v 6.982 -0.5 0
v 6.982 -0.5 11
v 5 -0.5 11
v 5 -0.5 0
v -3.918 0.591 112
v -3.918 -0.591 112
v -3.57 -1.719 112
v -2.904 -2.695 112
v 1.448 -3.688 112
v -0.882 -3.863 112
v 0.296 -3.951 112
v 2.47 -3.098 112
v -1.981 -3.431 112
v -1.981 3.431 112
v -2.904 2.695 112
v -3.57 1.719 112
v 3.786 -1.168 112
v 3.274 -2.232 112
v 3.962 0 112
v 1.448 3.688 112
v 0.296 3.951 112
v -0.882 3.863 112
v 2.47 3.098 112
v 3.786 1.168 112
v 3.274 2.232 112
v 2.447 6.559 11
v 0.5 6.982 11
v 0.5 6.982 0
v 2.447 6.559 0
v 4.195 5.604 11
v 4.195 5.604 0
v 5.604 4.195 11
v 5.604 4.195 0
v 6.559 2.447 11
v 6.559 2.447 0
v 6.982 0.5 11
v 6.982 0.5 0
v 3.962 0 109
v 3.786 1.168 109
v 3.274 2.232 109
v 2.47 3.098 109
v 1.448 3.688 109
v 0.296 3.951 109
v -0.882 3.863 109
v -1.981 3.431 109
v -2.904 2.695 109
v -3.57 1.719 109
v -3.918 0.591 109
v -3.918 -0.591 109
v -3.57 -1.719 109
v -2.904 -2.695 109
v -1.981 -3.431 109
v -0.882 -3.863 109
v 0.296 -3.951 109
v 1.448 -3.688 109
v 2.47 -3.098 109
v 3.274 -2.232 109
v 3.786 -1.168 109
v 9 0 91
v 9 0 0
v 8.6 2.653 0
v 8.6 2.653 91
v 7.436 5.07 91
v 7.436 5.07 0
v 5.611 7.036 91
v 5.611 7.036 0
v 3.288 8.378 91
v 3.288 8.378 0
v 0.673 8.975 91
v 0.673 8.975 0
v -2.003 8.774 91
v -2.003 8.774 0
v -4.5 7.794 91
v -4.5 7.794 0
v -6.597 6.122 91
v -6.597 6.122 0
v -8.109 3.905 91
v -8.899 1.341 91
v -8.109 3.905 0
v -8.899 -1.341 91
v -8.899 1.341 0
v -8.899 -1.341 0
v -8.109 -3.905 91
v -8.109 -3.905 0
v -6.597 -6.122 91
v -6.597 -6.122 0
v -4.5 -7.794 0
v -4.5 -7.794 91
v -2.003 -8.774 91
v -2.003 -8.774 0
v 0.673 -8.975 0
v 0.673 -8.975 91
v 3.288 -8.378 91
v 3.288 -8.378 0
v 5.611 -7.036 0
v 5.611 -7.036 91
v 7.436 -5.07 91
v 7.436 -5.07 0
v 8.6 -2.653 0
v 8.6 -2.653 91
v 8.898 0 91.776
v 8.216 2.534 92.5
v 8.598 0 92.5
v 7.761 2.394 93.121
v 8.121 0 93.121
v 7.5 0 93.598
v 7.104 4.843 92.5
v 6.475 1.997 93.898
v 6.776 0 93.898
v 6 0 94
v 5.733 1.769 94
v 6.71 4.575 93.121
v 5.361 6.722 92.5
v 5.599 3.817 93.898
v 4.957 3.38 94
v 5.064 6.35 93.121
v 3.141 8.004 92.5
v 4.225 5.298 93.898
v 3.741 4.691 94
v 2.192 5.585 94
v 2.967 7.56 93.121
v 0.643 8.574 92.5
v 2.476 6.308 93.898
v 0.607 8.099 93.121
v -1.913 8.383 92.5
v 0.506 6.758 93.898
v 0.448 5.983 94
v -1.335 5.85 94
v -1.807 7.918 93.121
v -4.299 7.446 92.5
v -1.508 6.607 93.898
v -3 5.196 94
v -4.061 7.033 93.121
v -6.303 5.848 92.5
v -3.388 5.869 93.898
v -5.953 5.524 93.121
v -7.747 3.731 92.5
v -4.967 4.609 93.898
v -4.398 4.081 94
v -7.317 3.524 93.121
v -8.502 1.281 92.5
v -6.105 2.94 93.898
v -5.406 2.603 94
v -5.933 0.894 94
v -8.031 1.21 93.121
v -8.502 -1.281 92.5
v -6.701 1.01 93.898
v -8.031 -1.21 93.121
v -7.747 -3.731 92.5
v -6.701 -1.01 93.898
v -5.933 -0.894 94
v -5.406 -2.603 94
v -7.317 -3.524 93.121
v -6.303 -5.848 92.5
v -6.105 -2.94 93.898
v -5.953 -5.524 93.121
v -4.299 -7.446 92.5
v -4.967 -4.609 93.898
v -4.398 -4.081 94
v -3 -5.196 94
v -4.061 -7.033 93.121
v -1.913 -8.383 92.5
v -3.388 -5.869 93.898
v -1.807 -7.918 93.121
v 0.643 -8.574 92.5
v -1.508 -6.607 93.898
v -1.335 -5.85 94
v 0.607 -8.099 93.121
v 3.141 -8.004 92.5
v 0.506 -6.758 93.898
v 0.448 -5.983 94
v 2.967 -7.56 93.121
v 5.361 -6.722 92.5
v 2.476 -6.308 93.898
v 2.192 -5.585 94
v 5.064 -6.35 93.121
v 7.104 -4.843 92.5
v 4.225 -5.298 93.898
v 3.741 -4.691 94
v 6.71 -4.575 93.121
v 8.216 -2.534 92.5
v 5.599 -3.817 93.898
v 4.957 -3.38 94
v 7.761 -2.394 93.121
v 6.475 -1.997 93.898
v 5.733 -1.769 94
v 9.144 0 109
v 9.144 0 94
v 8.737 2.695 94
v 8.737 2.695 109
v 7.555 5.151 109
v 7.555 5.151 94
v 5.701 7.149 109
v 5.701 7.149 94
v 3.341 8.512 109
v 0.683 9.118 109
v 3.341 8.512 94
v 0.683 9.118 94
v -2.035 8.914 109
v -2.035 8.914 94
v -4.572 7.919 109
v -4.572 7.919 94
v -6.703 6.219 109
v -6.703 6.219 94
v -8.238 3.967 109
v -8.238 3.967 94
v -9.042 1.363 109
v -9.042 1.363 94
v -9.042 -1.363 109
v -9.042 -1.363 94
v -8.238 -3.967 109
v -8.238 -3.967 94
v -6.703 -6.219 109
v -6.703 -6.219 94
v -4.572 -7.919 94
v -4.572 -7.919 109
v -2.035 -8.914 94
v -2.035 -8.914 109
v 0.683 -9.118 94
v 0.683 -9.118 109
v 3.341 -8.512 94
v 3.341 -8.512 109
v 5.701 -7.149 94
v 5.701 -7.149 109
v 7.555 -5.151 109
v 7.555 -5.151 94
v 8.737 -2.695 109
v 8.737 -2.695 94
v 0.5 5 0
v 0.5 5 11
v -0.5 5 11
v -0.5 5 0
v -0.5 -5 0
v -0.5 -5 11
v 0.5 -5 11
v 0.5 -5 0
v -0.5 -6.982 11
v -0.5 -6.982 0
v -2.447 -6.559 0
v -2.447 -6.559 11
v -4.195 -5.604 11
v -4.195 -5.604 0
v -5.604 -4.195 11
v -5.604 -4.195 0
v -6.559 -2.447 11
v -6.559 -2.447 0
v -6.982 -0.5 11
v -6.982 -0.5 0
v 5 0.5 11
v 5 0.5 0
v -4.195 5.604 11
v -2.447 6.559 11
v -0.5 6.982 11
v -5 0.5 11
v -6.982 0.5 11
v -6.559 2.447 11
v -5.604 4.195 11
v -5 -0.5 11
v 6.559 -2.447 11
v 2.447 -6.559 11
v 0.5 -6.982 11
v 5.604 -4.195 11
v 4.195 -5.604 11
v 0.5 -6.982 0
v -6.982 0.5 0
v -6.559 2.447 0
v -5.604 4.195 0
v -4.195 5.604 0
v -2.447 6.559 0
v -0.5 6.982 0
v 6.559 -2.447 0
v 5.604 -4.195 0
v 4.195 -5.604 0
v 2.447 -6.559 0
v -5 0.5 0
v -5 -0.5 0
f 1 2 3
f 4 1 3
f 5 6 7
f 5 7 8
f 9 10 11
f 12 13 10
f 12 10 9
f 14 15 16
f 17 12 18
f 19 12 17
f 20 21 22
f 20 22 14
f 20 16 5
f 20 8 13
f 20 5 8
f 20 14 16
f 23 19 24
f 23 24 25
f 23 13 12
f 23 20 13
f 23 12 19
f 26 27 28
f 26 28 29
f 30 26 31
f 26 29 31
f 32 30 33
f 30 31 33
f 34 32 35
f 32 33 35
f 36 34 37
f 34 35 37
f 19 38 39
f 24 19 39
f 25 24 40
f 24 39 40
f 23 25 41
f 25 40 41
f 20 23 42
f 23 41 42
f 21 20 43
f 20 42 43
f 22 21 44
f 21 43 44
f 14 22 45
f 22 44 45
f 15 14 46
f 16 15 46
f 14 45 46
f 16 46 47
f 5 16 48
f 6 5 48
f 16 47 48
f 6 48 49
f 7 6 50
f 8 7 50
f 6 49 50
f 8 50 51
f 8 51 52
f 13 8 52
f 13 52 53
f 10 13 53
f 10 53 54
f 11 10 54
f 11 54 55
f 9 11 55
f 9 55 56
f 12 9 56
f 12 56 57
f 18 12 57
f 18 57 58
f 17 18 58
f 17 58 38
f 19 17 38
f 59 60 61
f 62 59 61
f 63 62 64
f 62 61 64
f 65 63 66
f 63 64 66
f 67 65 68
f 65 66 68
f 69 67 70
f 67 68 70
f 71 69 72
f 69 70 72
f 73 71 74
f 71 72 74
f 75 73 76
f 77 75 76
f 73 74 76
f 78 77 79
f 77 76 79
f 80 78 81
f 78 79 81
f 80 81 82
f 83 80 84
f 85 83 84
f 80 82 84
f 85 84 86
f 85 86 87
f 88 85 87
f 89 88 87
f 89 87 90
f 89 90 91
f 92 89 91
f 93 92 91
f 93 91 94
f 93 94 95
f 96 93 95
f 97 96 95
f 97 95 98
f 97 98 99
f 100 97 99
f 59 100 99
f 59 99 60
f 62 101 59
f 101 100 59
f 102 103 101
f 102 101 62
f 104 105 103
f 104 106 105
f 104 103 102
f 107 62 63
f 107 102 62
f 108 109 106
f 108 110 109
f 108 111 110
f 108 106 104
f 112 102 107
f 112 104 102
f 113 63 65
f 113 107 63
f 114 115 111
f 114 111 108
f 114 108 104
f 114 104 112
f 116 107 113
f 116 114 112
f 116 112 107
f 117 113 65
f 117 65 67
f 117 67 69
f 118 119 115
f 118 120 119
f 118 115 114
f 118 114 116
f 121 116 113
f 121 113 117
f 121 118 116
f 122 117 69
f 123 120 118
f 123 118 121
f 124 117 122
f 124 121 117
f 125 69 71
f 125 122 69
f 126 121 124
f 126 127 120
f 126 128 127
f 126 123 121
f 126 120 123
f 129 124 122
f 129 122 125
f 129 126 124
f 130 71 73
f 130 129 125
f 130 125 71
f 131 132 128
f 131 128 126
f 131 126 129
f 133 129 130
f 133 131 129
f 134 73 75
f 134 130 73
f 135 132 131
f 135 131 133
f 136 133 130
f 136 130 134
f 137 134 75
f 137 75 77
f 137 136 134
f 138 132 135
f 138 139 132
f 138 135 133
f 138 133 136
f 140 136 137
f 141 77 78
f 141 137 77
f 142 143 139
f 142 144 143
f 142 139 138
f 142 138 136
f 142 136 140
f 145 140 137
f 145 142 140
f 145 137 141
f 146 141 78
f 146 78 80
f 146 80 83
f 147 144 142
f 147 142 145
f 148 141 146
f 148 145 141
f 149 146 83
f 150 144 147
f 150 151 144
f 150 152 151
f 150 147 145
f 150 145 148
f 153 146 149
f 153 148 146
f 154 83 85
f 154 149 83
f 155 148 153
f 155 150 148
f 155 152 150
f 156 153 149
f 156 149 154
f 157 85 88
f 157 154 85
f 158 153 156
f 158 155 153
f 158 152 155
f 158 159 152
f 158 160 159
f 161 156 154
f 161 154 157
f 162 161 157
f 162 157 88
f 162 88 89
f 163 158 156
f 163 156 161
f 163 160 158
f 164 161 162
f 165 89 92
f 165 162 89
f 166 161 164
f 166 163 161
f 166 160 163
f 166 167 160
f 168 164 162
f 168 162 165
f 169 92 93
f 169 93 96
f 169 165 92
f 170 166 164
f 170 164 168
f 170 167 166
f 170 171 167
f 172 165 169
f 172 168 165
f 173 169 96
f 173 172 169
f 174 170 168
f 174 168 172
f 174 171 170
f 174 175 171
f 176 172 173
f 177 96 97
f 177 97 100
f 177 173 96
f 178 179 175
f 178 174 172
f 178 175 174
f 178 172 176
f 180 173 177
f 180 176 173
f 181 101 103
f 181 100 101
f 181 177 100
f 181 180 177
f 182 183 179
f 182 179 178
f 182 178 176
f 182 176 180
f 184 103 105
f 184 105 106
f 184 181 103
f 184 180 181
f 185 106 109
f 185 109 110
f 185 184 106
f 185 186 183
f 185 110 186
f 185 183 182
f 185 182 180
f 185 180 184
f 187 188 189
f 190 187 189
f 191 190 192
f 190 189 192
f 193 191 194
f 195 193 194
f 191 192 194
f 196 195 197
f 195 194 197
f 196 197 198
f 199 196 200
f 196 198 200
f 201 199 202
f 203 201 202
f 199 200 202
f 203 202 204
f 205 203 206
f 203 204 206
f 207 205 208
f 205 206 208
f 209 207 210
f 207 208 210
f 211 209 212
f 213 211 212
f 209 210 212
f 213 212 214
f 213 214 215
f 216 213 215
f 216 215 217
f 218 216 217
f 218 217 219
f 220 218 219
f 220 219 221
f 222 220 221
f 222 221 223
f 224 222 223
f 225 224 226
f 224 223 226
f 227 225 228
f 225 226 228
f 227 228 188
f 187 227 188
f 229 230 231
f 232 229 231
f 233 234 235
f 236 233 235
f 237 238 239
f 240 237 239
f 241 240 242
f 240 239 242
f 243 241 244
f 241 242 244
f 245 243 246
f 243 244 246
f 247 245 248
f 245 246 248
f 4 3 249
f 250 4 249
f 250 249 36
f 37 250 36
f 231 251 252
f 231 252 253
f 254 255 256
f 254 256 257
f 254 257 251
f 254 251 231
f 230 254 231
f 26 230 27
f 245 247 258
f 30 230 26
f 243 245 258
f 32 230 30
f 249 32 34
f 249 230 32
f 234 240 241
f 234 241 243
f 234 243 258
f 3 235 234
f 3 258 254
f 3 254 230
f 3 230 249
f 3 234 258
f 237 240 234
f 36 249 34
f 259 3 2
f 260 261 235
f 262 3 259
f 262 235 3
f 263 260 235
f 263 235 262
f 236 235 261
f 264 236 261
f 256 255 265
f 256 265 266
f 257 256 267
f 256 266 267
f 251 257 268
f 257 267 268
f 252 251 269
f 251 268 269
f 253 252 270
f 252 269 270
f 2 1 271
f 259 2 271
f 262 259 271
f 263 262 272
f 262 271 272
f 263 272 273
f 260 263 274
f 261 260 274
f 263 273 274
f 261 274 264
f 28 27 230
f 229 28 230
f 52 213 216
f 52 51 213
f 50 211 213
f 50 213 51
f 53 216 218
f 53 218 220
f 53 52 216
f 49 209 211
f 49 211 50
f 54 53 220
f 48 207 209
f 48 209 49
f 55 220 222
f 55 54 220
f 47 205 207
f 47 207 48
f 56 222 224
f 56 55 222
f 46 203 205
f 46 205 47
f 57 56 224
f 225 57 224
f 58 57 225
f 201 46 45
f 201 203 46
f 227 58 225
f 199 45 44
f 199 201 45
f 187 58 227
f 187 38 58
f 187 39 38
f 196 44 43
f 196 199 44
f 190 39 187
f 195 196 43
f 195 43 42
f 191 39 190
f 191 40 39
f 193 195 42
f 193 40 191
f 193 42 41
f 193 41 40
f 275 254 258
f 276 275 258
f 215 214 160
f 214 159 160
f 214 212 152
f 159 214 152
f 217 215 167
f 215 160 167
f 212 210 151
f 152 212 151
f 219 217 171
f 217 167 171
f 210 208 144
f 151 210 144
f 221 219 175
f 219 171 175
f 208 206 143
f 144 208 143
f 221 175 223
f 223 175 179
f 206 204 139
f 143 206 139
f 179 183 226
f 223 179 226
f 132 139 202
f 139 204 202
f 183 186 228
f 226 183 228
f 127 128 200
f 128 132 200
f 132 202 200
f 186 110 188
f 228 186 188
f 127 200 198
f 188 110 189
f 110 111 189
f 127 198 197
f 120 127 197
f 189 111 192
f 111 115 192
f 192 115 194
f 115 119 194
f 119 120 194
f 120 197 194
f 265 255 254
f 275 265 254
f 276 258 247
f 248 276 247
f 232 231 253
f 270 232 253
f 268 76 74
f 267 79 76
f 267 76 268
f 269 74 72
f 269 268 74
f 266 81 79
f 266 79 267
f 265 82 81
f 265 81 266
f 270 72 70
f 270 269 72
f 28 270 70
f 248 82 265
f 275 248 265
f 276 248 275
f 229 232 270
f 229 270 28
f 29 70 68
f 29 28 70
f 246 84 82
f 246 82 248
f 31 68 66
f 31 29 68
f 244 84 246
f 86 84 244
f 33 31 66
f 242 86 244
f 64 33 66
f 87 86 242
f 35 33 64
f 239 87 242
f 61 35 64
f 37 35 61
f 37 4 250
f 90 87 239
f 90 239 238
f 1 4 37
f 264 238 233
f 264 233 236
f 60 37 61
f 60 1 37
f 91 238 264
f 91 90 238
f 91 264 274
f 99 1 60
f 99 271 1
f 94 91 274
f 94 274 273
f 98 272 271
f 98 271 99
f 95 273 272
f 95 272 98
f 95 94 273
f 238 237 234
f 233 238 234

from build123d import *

# Parameters (mm, degrees)
F0_W      = 9
F0_H      = 89
F2_R      = 9
F3_DEPTH  = 5
F4_R      = 3
F5_R      = 7
F6_DEPTH  = 11
F8_DEPTH  = 11
F10_R     = 3.9621233683
F11_DEPTH = 18
F9_R      = 9.1436864808
F12_DEPTH = 15


with BuildPart() as f1:
    # F0 (on Front) → F1 (revolve)
    with BuildSketch(Plane.XZ):
        with Locations((4.5, 44.5)):
            Rectangle(F0_W, F0_H)
    revolve(axis=Axis((0, 0, 44.5), (0, 0, -1)))

    # F2 (on face) → F3 (join)
    with BuildSketch(Plane.XY.offset(89)):
        Circle(F2_R)
    extrude(amount=F3_DEPTH)

    # F4
    f4_edges = [f1.edges().sort_by_distance(p)[0] for p in [
        (-9, 0, 94),
    ]]
    fillet(f4_edges, radius=F4_R)

    # F5 (on face) → F6 (cut)
    with BuildSketch(Plane(origin=(0, 0, 0), x_dir=(1, 0, 0), z_dir=(0, 0, -1))):
        Circle(F5_R)
    extrude(amount=-F6_DEPTH, mode=Mode.SUBTRACT)

    # F7 (on face) → F8 (join)
    with BuildSketch(Plane(origin=(0, 0, 11), x_dir=(1, 0, 0), z_dir=(0, 0, -1))):
        with BuildLine():
            Line((-0.5, 5), (0, 5))
            Line((0, 5), (0.5, 5))
            Line((0.5, 5), (0.5, 6.9821200219))
            ThreePointArc((0.5, 6.9821200219), (0, 7), (-0.5, 6.9821200219))
            Line((-0.5, 6.9821200219), (-0.5, 5))
        make_face()
        with BuildLine():
            ThreePointArc((7, 0), (6.9955285774, 0.2501597957), (6.9821200219, 0.5))
            Line((6.9821200219, 0.5), (5, 0.5))
            Line((5, 0.5), (5, 0))
            Line((5, 0), (5, -0.5))
            Line((5, -0.5), (6.9821200219, -0.5))
            ThreePointArc((6.9821200219, -0.5), (6.9955285774, -0.2501597957), (7, 0))
        make_face()
        with BuildLine():
            Line((-5, 0.5), (-6.9821200219, 0.5))
            ThreePointArc((-6.9821200219, 0.5), (-7, 0), (-6.9821200219, -0.5))
            Line((-6.9821200219, -0.5), (-5, -0.5))
            Line((-5, -0.5), (-5, 0))
            Line((-5, 0), (-5, 0.5))
        make_face()
        with BuildLine():
            Line((-0.5, -5), (-0.5, -6.9821200219))
            ThreePointArc((-0.5, -6.9821200219), (0, -7), (0.5, -6.9821200219))
            Line((0.5, -6.9821200219), (0.5, -5))
            Line((0.5, -5), (0, -5))
            Line((0, -5), (-0.5, -5))
        make_face()
    extrude(amount=F8_DEPTH)

    # F10 (on face) → F11 (join)
    with BuildSketch(Plane.XY.offset(94)):
        Circle(F10_R)
    extrude(amount=F11_DEPTH)

    # F9 (on face) → F12 (join)
    with BuildSketch(Plane.XY.offset(94)):
        Circle(F9_R)
    extrude(amount=F12_DEPTH)


solid = f1.part
